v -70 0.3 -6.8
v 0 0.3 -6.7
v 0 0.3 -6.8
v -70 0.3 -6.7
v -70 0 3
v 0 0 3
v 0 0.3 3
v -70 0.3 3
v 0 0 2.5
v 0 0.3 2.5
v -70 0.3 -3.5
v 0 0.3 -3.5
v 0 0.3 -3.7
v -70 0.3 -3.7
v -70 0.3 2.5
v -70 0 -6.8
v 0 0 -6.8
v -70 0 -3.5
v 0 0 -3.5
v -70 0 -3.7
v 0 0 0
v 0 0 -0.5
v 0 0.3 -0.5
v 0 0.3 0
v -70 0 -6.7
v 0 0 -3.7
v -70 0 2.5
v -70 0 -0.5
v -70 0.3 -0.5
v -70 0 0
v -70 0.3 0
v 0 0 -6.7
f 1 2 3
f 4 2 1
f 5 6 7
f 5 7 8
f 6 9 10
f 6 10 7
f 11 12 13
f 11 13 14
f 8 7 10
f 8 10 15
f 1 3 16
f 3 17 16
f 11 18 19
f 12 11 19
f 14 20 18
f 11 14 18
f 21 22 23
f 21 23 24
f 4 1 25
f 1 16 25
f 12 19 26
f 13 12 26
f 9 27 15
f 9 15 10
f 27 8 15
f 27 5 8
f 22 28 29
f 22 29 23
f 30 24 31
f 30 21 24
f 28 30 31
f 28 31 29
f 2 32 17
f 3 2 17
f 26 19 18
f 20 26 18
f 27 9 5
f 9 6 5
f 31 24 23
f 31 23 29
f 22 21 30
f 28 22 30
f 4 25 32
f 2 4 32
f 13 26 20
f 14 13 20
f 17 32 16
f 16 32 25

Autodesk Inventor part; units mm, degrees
ref_plane "YZ Plane" through (0, 0, 0) normal (1, 0, 0) x (0, 1, 0)
ref_plane "XZ Plane" through (0, 0, 0) normal (0, 1, 0) x (-1, 0, 0)
ref_plane "XY Plane" through (0, 0, 0) normal (0, 0, 1) x (1, 0, 0)
sketch "Sketch1" plane through (0, 0, 0) normal (0, 1, 0) x (-1, 0, 0)
  line L0 (0, 0) -> (70, 0)
  line L1 (70, 0) -> (70, -0.5)
  line L2 (70, -0.5) -> (0, -0.5)
  line L3 (0, -0.5) -> (0, 0)
  line L4 (70, -3.5) -> (0, -3.5)
  line L5 (0, -3.5) -> (0, -3.7)
  line L6 (0, -3.7) -> (70, -3.7)
  line L7 (70, -3.7) -> (70, -3.5)
  line L8 (70, -6.7) -> (0, -6.7)
  line L9 (0, -6.7) -> (0, -6.8)
  line L10 (0, -6.8) -> (70, -6.8)
  line L11 (70, -6.8) -> (70, -6.7)
  line L12 (0, 3) -> (70, 3)
  line L13 (70, 3) -> (70, 2.5)
  line L14 (70, 2.5) -> (0, 2.5)
  line L15 (0, 2.5) -> (0, 3)
  point P0 (70, -4.8229)
  dimension "d0" = 70
  dimension "d1" = 0.5
  dimension "d2" = 70
  dimension "d3" = 0.2
  dimension "d4" = 3
  dimension "d5" = 70
  dimension "d6" = 0.1
  dimension "d7" = 3
  dimension "d8" = 0
  dimension "d9" = 70
  dimension "d10" = 0.5
  dimension "d11" = 3
  dimension "d12" = 0
extrude "Extrusion1" add sketch "Sketch1" along normal blind 0.3
properties part number "WAVEGUIDES"
